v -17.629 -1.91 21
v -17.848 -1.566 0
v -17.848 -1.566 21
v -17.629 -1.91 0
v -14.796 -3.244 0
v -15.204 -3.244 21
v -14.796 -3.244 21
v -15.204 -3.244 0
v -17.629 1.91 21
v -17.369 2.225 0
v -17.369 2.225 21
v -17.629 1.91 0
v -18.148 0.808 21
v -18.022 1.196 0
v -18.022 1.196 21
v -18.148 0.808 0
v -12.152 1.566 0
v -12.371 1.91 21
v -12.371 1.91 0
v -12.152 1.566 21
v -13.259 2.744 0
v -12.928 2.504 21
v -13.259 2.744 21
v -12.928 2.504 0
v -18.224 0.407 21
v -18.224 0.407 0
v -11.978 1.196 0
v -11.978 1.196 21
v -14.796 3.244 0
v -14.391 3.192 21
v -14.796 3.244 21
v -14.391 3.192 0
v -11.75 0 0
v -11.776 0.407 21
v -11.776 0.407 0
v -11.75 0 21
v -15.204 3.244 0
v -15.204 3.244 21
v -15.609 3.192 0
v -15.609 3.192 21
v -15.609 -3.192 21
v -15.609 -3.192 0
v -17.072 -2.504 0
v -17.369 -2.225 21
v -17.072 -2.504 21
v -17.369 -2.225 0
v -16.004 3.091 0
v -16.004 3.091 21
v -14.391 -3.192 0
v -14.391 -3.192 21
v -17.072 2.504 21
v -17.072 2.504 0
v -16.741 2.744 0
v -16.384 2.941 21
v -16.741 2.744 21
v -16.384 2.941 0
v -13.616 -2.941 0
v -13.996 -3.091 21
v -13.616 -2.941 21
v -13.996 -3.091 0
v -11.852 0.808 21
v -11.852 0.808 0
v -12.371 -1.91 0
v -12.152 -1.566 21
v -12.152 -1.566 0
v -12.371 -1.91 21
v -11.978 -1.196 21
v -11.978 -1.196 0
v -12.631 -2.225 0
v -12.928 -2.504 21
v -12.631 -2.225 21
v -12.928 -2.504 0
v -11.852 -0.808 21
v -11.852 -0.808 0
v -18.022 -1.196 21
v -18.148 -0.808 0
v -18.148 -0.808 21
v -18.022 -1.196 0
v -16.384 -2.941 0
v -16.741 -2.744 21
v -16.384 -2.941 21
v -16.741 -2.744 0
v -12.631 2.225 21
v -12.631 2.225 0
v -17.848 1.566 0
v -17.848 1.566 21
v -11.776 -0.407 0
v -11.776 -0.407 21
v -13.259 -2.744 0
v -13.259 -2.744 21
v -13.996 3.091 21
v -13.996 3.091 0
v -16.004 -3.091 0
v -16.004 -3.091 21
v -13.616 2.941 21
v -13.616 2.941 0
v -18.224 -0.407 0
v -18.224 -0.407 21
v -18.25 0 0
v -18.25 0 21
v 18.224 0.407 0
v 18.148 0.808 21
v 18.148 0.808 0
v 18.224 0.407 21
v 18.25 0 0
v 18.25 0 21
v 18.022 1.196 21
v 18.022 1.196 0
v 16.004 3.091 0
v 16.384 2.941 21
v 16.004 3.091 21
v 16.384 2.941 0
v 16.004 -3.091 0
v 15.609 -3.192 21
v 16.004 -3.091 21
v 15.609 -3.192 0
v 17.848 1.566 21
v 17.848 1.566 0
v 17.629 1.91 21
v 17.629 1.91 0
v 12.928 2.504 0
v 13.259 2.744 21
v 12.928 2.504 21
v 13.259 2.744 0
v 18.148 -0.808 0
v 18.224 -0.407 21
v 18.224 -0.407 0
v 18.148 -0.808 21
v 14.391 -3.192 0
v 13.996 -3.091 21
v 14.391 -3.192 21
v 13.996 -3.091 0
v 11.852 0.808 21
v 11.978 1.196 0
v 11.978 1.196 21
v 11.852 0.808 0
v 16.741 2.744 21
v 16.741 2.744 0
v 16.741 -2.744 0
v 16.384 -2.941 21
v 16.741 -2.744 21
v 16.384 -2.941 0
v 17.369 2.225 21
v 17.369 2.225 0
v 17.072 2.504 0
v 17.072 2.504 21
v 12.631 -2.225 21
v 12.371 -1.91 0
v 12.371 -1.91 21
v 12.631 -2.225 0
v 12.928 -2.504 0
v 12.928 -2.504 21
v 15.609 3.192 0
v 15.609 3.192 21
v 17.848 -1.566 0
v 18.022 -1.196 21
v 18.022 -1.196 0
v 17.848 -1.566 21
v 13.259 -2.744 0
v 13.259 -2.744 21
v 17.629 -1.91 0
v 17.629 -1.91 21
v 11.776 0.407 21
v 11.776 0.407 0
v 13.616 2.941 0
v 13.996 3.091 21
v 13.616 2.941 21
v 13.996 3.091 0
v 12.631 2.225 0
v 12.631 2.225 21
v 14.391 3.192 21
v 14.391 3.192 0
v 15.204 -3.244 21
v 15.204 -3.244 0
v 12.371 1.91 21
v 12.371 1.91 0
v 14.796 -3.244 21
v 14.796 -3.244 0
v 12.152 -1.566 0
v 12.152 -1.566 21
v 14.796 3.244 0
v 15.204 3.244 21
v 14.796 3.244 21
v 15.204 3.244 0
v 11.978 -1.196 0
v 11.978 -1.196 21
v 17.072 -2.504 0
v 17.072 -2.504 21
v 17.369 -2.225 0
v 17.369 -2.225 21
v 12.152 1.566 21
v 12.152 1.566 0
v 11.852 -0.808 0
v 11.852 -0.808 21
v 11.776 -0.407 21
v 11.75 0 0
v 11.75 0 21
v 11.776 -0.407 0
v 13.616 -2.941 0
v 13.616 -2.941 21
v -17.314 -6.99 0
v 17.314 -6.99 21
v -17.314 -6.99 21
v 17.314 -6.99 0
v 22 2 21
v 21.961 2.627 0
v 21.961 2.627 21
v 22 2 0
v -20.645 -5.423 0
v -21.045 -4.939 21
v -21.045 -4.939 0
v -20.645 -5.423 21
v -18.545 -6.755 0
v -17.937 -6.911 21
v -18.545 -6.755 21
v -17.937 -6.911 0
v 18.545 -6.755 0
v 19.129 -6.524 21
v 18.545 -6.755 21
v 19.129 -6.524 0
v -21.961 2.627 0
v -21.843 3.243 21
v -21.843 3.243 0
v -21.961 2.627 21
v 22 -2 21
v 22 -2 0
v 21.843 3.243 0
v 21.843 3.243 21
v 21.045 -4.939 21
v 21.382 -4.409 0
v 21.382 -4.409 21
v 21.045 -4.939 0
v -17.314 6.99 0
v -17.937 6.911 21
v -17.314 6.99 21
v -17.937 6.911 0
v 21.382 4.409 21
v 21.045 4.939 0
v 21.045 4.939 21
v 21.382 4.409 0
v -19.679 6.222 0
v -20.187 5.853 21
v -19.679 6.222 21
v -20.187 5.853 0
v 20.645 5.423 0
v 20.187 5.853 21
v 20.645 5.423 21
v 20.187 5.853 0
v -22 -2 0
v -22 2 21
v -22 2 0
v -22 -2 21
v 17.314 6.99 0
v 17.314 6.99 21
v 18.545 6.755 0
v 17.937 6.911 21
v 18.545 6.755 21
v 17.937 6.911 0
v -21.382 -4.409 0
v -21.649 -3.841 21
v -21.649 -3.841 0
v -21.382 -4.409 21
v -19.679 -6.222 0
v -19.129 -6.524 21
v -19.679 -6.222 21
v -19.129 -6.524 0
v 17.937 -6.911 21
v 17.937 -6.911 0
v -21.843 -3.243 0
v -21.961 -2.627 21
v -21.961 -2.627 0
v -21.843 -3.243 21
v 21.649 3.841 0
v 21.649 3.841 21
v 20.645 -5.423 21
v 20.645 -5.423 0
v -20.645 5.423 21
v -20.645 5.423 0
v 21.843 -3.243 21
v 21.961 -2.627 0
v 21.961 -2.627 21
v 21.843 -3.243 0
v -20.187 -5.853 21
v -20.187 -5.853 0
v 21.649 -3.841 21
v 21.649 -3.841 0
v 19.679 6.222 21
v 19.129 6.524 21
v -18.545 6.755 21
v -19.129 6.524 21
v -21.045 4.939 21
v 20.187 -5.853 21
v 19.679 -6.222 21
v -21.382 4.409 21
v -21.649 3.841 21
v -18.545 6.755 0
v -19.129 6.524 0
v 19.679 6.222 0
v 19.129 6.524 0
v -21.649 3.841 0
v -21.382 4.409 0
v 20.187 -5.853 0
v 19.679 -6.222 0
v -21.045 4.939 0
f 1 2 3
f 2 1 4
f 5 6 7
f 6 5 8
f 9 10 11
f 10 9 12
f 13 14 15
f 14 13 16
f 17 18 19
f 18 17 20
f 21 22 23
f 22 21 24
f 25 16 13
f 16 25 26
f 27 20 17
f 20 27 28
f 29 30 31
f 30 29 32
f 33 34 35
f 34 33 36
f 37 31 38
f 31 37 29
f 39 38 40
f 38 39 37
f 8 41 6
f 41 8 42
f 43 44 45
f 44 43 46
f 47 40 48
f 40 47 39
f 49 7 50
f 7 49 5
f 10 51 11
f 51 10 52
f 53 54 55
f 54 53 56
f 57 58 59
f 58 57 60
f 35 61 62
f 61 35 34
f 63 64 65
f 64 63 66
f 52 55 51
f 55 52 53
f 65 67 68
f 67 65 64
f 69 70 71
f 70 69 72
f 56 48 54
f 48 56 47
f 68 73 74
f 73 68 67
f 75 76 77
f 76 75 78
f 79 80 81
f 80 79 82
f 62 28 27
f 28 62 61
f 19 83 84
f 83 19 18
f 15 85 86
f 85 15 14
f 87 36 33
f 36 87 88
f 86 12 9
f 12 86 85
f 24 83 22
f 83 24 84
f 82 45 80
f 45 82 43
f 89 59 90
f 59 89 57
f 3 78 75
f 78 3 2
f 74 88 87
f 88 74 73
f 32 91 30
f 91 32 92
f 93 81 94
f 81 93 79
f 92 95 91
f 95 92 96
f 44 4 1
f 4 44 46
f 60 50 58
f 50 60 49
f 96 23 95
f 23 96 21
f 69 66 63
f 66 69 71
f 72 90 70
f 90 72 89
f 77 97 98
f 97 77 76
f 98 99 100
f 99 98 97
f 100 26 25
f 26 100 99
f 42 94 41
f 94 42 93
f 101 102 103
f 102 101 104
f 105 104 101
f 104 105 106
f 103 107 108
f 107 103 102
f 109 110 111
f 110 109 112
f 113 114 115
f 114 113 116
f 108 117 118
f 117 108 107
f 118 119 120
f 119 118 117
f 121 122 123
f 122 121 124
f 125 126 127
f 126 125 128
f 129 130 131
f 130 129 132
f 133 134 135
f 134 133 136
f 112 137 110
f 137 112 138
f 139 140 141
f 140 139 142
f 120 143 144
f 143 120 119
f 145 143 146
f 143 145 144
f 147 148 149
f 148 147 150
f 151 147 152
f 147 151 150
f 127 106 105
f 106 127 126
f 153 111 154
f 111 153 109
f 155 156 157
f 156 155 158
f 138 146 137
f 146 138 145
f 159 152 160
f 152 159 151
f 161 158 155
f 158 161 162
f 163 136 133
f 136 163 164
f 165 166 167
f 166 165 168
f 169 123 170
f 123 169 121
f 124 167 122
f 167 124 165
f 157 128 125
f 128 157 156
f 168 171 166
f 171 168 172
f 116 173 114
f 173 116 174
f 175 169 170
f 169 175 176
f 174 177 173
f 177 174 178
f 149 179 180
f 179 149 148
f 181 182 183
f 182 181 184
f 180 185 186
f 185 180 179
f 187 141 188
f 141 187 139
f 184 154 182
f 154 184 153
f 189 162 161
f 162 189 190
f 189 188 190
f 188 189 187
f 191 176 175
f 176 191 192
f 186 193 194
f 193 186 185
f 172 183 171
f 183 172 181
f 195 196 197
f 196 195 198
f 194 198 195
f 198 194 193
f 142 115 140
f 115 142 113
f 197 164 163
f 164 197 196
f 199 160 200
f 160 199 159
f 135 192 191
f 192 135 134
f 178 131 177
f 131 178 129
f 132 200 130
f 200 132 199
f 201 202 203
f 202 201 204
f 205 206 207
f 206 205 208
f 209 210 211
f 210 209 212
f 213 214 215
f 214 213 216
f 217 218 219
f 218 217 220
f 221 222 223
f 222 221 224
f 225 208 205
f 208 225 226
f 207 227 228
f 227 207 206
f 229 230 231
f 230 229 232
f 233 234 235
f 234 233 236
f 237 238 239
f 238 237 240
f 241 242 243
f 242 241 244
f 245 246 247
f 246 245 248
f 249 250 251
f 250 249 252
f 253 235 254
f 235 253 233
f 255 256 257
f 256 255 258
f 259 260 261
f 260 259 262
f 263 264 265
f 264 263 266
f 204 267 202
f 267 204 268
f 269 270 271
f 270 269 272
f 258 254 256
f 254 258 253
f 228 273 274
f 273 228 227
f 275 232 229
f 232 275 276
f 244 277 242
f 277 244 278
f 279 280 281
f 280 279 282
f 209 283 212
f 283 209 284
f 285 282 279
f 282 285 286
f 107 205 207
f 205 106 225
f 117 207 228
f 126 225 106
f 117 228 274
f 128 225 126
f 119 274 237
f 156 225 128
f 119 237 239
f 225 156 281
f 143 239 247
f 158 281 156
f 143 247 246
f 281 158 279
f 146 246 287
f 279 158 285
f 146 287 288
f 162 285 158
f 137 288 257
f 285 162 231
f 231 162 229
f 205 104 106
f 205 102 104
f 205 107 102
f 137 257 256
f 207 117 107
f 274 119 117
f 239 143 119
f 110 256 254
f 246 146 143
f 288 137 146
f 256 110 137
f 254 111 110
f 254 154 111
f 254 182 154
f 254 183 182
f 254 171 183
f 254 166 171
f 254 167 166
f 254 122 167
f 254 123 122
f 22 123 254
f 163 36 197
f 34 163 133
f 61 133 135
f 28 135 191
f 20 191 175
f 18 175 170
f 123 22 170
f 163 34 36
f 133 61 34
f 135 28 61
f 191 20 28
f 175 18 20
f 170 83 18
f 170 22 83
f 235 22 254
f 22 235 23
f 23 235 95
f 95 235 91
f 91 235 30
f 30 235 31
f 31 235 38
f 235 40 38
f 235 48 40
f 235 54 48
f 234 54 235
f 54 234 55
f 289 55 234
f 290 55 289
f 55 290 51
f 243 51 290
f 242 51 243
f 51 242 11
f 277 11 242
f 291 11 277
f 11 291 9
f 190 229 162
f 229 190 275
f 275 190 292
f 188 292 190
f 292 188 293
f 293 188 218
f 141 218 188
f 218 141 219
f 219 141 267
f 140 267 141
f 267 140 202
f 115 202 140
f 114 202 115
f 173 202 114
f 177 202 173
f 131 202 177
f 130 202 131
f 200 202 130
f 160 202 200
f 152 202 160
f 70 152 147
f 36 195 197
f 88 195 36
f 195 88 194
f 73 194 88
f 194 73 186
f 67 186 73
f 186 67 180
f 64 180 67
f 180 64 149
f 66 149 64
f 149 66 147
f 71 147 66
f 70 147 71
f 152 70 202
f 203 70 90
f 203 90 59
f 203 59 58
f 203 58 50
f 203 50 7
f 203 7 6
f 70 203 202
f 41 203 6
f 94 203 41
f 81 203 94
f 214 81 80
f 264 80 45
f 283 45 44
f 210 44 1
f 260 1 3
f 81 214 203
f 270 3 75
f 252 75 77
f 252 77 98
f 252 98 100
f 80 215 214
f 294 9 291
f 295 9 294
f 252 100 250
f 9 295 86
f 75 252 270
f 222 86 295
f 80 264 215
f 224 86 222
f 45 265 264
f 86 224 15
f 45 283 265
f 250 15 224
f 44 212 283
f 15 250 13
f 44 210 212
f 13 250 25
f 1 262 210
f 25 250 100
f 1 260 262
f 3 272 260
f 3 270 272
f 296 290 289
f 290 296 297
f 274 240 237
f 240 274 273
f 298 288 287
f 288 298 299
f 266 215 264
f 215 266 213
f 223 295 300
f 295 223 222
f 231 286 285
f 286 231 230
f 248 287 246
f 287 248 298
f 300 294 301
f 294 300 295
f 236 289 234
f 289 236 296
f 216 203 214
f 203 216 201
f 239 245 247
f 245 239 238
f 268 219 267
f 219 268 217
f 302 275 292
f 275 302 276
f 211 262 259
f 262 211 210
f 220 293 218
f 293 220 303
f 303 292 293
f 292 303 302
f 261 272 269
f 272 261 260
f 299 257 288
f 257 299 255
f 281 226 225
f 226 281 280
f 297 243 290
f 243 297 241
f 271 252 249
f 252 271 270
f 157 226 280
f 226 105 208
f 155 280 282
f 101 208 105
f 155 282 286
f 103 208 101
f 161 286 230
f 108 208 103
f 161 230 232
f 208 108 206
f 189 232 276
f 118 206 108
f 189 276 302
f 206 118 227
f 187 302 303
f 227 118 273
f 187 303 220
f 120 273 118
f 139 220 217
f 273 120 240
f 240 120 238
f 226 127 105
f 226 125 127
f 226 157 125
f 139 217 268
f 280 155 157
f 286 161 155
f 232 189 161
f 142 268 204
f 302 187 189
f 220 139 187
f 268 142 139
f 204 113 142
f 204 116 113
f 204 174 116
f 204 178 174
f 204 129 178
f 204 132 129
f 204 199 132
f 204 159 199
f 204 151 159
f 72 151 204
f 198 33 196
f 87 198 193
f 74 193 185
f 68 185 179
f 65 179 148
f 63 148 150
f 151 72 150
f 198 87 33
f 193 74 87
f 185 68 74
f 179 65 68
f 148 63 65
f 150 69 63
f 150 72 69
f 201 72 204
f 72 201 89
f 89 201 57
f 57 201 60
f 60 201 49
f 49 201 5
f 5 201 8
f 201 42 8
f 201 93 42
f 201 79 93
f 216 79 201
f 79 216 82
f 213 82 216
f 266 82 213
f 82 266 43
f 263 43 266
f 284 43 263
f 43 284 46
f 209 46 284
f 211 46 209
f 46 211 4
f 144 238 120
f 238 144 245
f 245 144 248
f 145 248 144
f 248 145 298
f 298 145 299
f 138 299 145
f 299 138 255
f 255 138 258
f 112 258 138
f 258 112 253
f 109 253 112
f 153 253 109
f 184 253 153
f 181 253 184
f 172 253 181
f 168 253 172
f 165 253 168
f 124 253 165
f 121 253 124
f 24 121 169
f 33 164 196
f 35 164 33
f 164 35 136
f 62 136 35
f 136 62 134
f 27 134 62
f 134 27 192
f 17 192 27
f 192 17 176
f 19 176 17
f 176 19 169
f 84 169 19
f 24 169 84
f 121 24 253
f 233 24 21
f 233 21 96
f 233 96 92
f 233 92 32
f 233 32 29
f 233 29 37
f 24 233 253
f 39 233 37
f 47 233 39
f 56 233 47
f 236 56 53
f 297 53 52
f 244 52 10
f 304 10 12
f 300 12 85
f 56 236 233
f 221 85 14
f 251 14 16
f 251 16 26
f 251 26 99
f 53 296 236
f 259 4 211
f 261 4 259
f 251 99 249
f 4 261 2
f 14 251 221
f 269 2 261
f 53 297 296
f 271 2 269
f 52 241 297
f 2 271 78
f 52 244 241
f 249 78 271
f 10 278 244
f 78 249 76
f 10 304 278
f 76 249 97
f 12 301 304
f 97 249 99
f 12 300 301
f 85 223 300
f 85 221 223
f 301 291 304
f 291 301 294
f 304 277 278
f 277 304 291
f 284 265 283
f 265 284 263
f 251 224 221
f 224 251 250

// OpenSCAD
$fn = 50;


difference() {
	union() {
		hull() {
			translate(v = [-17.0000000000, 2.0000000000, 0]) {
				cylinder(h = 21, r = 5);
			}
			translate(v = [17.0000000000, 2.0000000000, 0]) {
				cylinder(h = 21, r = 5);
			}
			translate(v = [-17.0000000000, -2.0000000000, 0]) {
				cylinder(h = 21, r = 5);
			}
			translate(v = [17.0000000000, -2.0000000000, 0]) {
				cylinder(h = 21, r = 5);
			}
		}
	}
	union() {
		translate(v = [-15.0000000000, 0.0000000000, -100.0000000000]) {
			cylinder(h = 200, r = 3.2500000000);
		}
		translate(v = [-15.0000000000, 0.0000000000, -100.0000000000]) {
			cylinder(h = 200, r = 3.2500000000);
		}
		translate(v = [15.0000000000, 0.0000000000, -100.0000000000]) {
			cylinder(h = 200, r = 3.2500000000);
		}
		translate(v = [15.0000000000, 0.0000000000, -100.0000000000]) {
			cylinder(h = 200, r = 3.2500000000);
		}
	}
}
